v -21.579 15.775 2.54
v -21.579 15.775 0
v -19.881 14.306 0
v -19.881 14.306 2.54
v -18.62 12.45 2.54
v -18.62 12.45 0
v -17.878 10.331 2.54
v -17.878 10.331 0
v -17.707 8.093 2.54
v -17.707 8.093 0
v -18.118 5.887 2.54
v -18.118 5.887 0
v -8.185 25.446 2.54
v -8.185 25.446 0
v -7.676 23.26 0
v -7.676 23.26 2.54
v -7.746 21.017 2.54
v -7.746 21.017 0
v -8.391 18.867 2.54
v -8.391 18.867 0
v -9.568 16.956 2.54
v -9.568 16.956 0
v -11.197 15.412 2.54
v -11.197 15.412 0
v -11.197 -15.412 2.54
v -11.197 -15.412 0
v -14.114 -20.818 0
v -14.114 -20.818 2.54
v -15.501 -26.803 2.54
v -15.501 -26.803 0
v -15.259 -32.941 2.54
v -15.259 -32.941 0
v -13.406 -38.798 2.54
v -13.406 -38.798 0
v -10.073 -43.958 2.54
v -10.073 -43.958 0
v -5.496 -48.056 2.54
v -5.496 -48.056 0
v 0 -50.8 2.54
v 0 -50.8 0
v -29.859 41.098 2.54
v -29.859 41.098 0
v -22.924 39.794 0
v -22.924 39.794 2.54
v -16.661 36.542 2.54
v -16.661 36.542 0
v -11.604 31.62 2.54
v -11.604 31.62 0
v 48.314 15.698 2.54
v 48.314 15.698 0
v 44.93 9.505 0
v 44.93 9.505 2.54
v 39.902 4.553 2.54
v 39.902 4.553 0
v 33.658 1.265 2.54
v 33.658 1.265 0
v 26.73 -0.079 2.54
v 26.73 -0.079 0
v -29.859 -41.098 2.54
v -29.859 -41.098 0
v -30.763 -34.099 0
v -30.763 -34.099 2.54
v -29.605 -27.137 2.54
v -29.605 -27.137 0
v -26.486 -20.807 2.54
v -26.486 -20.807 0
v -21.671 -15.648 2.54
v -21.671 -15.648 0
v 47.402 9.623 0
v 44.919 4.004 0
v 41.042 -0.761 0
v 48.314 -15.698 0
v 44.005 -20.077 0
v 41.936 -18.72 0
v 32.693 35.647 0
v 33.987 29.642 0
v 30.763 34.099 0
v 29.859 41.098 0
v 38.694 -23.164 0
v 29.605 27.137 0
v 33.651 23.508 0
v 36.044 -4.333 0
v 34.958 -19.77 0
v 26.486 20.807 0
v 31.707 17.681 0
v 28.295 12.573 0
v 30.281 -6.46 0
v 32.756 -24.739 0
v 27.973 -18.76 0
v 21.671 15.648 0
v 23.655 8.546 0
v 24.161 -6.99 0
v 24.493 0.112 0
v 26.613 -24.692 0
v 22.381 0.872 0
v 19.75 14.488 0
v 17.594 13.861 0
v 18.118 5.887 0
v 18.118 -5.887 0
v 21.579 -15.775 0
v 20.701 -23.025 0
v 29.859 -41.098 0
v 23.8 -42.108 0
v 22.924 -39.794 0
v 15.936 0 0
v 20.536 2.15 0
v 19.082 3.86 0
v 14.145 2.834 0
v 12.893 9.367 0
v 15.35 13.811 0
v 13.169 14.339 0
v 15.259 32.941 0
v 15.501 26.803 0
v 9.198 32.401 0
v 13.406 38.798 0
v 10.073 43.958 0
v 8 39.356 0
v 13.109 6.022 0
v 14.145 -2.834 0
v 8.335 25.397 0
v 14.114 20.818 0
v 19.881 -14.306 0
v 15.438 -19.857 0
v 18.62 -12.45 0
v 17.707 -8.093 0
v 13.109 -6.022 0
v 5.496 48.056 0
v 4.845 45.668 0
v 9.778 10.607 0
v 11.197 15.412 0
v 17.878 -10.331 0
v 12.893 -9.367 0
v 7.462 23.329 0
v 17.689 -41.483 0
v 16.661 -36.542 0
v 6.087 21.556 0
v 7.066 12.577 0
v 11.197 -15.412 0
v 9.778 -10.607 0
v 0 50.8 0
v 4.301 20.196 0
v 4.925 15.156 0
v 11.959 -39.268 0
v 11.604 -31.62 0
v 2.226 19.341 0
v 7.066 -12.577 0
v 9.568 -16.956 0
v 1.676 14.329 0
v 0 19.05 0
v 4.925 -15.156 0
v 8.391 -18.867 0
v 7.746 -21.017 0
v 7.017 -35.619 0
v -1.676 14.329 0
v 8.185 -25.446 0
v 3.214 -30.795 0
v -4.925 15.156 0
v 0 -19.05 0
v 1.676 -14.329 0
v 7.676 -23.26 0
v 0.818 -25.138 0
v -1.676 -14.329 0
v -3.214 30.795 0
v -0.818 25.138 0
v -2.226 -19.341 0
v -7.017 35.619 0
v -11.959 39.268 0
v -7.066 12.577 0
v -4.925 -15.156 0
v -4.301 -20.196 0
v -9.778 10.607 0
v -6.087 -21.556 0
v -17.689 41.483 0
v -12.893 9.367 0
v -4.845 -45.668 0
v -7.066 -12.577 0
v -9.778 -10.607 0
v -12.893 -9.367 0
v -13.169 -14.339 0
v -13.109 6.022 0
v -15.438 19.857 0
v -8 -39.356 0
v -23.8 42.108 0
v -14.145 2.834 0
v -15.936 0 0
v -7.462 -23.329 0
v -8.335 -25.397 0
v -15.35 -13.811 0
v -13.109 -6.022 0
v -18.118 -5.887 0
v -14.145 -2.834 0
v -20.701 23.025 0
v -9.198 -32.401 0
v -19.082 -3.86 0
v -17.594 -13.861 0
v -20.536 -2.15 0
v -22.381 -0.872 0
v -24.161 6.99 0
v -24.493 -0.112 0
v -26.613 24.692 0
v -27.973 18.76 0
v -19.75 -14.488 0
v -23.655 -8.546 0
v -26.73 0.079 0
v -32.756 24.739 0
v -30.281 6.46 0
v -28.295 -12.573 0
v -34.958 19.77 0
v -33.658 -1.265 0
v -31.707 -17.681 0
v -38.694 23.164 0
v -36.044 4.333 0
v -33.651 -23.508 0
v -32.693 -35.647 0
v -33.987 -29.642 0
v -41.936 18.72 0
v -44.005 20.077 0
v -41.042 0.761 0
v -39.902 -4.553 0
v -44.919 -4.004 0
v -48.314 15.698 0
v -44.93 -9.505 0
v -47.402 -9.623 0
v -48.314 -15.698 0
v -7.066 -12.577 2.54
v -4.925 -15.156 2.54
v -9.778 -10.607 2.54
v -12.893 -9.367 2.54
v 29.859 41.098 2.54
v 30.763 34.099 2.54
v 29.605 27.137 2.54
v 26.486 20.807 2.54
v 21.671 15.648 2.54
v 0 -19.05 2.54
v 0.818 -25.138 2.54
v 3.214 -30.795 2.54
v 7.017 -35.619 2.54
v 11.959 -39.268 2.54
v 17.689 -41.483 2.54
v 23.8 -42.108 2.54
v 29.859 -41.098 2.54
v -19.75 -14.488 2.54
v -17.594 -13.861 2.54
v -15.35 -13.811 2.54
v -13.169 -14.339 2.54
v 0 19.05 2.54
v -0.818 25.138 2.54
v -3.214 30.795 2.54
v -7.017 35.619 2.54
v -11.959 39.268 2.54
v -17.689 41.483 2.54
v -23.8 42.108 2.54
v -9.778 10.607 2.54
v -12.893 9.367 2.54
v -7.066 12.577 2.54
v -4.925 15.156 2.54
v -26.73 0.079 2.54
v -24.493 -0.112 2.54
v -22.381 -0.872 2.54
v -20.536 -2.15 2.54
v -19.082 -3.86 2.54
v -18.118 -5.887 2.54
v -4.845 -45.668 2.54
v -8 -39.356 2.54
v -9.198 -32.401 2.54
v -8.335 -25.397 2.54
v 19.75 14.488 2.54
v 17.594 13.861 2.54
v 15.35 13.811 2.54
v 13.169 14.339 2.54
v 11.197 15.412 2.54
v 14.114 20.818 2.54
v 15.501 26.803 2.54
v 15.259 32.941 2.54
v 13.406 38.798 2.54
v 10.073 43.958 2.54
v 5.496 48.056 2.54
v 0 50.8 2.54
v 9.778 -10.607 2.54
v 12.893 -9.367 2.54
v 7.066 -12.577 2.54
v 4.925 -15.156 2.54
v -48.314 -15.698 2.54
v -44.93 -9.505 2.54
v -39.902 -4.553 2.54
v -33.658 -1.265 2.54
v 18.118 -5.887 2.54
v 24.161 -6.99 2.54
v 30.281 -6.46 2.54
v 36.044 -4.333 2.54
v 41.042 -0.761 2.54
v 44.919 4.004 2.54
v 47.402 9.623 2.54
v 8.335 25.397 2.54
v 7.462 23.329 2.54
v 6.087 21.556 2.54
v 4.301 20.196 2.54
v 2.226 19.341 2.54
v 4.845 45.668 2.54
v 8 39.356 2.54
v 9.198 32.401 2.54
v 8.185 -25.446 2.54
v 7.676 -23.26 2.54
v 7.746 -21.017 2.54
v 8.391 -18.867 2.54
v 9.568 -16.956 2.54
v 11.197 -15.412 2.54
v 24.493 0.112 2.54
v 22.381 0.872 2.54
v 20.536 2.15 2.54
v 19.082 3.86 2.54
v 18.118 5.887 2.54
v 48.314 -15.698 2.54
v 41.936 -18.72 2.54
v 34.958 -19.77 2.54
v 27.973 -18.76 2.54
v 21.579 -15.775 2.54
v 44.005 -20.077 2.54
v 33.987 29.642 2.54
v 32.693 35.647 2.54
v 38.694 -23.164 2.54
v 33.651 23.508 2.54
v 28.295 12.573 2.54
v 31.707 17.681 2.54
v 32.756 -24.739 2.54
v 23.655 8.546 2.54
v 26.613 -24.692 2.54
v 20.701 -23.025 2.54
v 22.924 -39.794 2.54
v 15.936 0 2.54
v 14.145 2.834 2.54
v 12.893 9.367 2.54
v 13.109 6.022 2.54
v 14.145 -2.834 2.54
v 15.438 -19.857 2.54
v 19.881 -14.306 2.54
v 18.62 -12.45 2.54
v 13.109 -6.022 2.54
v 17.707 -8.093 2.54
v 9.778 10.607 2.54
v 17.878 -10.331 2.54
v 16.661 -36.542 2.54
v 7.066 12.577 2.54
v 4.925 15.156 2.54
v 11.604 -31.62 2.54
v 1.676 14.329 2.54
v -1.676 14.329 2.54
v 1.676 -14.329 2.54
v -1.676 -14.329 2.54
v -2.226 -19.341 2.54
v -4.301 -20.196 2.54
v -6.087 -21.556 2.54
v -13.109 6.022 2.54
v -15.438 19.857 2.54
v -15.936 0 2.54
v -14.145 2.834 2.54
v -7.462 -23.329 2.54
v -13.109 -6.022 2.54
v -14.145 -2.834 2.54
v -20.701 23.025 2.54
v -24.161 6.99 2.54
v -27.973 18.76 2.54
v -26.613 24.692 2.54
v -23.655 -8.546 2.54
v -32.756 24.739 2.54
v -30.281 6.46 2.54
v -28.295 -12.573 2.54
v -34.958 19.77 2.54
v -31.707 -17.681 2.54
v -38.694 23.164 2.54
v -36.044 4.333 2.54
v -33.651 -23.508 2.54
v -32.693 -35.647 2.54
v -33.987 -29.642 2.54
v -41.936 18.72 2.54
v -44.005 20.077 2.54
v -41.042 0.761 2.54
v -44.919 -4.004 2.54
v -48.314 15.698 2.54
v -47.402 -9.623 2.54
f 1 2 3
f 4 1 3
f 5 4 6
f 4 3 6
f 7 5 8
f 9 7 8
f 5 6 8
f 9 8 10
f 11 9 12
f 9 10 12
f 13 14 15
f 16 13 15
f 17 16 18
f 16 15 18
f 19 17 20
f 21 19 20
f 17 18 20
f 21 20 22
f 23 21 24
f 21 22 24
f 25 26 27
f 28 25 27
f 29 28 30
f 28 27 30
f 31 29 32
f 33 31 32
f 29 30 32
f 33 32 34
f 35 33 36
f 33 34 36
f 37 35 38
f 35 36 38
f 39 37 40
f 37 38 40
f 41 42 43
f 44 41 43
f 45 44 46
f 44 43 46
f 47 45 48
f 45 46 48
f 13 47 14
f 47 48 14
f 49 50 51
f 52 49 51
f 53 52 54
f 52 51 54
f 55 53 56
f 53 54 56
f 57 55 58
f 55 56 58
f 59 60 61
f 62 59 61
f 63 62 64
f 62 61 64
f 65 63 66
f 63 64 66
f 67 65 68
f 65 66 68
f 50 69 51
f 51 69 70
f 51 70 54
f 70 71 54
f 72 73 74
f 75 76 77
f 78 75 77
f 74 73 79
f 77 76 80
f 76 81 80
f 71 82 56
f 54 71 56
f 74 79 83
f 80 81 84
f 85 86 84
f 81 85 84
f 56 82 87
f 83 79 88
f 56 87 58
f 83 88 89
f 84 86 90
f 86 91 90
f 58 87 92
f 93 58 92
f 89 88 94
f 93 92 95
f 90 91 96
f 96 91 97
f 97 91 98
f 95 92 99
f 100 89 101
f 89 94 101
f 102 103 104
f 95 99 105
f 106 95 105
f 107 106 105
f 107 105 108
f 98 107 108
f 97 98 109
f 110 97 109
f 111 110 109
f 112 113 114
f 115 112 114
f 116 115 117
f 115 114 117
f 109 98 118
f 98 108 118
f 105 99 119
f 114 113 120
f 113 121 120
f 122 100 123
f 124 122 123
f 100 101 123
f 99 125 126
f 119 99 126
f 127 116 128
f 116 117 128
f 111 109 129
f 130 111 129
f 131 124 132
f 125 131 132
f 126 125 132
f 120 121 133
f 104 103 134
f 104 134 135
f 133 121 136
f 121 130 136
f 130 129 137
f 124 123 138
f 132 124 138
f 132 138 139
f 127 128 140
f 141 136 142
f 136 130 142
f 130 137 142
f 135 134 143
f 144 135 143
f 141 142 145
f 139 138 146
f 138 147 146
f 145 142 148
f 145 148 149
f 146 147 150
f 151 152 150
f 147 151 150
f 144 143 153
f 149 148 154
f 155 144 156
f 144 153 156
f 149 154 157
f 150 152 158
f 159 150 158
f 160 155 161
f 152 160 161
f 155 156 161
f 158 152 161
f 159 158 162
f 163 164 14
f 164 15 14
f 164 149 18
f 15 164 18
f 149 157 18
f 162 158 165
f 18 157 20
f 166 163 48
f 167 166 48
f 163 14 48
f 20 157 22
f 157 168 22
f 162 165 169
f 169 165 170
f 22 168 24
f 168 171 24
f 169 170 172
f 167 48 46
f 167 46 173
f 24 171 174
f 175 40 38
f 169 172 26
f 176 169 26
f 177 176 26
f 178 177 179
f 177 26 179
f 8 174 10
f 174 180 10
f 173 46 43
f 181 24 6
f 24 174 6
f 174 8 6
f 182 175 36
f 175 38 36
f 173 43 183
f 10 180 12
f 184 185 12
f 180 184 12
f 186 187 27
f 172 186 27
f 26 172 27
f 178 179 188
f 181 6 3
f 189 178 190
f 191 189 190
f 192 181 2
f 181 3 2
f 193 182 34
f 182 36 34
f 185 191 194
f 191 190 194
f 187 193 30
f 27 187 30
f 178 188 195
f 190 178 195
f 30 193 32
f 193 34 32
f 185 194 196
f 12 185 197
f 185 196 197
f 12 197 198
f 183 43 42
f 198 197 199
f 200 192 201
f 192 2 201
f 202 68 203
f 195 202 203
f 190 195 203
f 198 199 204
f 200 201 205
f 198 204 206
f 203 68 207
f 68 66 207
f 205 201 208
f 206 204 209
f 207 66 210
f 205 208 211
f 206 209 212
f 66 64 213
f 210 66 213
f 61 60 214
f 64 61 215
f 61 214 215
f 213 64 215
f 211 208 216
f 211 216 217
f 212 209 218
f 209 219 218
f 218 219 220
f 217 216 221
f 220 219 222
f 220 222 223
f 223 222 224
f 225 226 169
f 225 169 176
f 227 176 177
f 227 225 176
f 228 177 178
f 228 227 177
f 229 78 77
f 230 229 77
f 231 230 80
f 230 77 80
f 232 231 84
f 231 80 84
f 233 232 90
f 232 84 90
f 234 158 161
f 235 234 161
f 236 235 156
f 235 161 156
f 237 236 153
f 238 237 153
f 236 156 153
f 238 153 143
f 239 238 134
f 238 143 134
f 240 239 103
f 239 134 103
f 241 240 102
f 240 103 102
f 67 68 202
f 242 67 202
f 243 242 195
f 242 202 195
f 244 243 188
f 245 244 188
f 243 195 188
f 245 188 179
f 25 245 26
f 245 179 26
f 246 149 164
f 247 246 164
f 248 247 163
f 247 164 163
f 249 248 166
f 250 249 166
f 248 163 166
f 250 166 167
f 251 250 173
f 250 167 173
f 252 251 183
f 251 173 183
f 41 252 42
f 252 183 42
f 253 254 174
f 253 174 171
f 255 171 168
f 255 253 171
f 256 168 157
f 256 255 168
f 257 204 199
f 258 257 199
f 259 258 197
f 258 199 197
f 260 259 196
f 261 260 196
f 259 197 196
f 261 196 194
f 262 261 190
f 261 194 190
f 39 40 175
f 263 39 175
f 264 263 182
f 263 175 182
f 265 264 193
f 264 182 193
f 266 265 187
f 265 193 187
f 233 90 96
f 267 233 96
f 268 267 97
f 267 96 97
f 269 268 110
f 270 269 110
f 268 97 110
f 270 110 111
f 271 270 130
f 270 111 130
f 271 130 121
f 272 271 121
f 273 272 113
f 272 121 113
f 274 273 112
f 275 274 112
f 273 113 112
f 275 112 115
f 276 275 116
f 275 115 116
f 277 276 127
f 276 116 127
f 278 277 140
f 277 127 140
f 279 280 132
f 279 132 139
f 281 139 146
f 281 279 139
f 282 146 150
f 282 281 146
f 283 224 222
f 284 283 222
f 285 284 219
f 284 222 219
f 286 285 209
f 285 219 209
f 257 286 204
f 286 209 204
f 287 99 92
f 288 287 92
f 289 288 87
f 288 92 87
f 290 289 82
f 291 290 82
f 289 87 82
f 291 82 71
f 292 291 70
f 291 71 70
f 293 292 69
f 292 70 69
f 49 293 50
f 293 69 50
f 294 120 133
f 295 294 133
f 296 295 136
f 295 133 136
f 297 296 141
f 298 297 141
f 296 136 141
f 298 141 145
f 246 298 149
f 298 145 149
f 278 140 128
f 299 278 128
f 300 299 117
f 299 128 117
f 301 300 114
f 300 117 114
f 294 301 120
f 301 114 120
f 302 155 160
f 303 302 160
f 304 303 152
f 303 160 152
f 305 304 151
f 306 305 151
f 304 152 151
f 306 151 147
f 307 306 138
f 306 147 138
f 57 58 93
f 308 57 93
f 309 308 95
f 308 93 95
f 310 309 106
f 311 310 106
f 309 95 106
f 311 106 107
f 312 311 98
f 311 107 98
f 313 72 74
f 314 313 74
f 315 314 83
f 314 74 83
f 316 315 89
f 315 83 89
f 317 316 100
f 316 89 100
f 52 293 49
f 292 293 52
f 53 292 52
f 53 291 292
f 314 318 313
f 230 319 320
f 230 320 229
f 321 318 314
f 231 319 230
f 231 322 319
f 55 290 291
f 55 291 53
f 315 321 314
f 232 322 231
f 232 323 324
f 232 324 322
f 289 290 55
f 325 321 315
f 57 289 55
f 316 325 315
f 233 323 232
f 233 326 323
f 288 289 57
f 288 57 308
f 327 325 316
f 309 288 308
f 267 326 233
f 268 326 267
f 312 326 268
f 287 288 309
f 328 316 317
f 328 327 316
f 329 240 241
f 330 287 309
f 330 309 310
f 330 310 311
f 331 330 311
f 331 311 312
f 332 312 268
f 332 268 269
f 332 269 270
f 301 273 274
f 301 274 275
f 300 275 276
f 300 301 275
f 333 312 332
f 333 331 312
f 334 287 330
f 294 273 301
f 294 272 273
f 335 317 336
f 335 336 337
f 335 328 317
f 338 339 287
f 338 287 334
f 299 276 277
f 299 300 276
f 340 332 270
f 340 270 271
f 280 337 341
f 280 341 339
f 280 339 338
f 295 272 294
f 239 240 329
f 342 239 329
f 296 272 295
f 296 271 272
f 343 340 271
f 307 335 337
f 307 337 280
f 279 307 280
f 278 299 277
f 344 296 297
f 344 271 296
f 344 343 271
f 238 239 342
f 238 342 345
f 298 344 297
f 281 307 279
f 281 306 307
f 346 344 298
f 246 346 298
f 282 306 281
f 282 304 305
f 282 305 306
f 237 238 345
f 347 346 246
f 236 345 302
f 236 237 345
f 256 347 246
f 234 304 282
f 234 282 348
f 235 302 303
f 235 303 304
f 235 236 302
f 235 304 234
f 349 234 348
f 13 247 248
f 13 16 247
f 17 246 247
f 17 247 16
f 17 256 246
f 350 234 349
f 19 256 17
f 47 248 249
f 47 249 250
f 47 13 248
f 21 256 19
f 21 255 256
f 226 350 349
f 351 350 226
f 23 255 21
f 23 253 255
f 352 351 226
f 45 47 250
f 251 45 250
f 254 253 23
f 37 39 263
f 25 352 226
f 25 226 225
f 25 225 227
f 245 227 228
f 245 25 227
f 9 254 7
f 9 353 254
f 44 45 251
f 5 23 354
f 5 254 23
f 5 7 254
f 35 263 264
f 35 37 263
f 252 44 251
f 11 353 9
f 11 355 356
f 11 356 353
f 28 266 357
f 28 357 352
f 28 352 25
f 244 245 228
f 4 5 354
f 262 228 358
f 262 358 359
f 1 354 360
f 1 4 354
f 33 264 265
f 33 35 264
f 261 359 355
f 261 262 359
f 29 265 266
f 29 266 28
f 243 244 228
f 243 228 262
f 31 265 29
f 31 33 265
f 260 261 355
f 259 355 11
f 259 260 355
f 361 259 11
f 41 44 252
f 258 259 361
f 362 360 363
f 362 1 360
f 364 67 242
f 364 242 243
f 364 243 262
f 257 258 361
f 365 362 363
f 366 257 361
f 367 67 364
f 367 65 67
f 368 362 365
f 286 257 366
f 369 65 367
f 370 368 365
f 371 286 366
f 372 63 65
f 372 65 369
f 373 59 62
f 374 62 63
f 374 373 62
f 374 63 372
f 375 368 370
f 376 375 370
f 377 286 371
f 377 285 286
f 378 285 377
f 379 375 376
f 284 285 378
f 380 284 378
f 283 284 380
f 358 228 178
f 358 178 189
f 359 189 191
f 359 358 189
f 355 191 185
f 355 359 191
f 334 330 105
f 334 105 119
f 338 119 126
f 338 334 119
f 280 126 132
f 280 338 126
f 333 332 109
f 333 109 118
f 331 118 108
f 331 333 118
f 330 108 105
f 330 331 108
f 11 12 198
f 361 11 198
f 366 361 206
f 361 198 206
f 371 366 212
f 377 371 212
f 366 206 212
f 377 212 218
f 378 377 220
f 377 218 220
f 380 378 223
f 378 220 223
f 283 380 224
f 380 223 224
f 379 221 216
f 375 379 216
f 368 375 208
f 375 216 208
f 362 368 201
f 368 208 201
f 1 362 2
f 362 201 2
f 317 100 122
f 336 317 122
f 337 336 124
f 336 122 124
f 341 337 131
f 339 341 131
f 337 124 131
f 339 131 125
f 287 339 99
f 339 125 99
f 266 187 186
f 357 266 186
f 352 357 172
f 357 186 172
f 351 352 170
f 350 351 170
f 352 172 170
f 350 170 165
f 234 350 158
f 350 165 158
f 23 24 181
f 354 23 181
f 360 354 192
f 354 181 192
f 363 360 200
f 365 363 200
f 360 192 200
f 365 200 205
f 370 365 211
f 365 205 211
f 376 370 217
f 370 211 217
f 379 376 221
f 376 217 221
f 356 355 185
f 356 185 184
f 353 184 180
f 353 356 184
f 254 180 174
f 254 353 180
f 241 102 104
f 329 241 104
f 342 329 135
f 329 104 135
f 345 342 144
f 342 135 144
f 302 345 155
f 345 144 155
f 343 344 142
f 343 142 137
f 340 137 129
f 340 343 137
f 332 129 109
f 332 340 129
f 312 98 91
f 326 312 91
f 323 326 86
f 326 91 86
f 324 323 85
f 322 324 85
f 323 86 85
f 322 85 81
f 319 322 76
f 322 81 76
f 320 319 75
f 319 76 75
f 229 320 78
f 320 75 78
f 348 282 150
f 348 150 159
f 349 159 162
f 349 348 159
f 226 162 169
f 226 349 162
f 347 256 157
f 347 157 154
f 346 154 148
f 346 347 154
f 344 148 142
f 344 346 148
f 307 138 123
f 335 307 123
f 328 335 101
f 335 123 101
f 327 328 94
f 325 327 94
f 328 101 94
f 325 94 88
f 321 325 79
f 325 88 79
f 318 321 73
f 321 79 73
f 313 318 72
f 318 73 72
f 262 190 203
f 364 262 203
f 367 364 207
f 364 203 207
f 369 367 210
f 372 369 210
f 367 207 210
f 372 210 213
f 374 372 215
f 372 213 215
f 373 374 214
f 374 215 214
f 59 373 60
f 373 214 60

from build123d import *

# Parameters (mm, degrees)
BOSS_EXTRUDE1_DEPTH = 2.54
CIRPATTERN1_COUNT   = 10
CUT_EXTRUDE1_REACH  = 72.152


with BuildPart() as part:
    # Sketch1 → Boss-Extrude1 (new body)
    with BuildSketch(Plane.XY):
        with BuildLine():
            Line((0, 0), (11.197309056, 15.411773743))
            ThreePointArc((11.197309056, 15.411773743), (14.528469134, 35.931399889), (0, 50.8))
            ThreePointArc((0, 50.8), (8.000279424, 39.356176552), (8.334788134, 25.39717695))
            ThreePointArc((8.334788134, 25.39717695), (5.238209343, 20.817448624), (0, 19.05))
            Line((0, 19.05), (0, 0))
        make_face()
    extrude(amount=BOSS_EXTRUDE1_DEPTH)


with BuildPart() as cirpattern1_1:
    # CirPattern1: pattern copy
    add(part.part.rotate(Axis((0, 0, 0), (0, 0, 1)), 1 * 360 / CIRPATTERN1_COUNT))


with BuildPart() as cirpattern1_2:
    # CirPattern1: pattern copy
    add(part.part.rotate(Axis((0, 0, 0), (0, 0, 1)), 2 * 360 / CIRPATTERN1_COUNT))


with BuildPart() as cirpattern1_3:
    # CirPattern1: pattern copy
    add(part.part.rotate(Axis((0, 0, 0), (0, 0, 1)), 3 * 360 / CIRPATTERN1_COUNT))


with BuildPart() as cirpattern1_4:
    # CirPattern1: pattern copy
    add(part.part.rotate(Axis((0, 0, 0), (0, 0, 1)), 4 * 360 / CIRPATTERN1_COUNT))


with BuildPart() as cirpattern1_5:
    # CirPattern1: pattern copy
    add(part.part.rotate(Axis((0, 0, 0), (0, 0, 1)), 5 * 360 / CIRPATTERN1_COUNT))


with BuildPart() as cirpattern1_6:
    # CirPattern1: pattern copy
    add(part.part.rotate(Axis((0, 0, 0), (0, 0, 1)), 6 * 360 / CIRPATTERN1_COUNT))


with BuildPart() as cirpattern1_7:
    # CirPattern1: pattern copy
    add(part.part.rotate(Axis((0, 0, 0), (0, 0, 1)), 7 * 360 / CIRPATTERN1_COUNT))


with BuildPart() as cirpattern1_8:
    # CirPattern1: pattern copy
    add(part.part.rotate(Axis((0, 0, 0), (0, 0, 1)), 8 * 360 / CIRPATTERN1_COUNT))


with BuildPart() as cirpattern1_9:
    # CirPattern1: pattern copy
    add(part.part.rotate(Axis((0, 0, 0), (0, 0, 1)), 9 * 360 / CIRPATTERN1_COUNT))


with BuildPart() as cirpattern1_8_1:
    add(cirpattern1_8.part)

    # Combine1: union CirPattern1_3, CirPattern1_7, CirPattern1_2, CirPattern1_6, part, CirPattern1_1, CirPattern1_5, CirPattern1_9, CirPattern1_4
    add(cirpattern1_3.part)
    add(cirpattern1_7.part)
    add(cirpattern1_2.part)
    add(cirpattern1_6.part)
    add(part.part)
    add(cirpattern1_1.part)
    add(cirpattern1_5.part)
    add(cirpattern1_9.part)
    add(cirpattern1_4.part)

    # Sketch2 → Cut-Extrude1 (cut, up to next)
    with BuildSketch(Plane.XY.offset(2.54), mode=Mode.PRIVATE) as cut_extrude1_sk1:
        with BuildLine():
            ThreePointArc((12.892749535, 9.36713084), (13.527827888, 4.395457728), (15.936314842, 0))
            ThreePointArc((15.936314842, 0), (13.527827888, -4.395457728), (12.892749535, -9.36713084))
            ThreePointArc((12.892749535, -9.36713084), (8.360657429, -11.507457728), (4.924592114, -15.156336076))
            ThreePointArc((4.924592114, -15.156336076), (0, -14.224), (-4.924592114, -15.156336076))
            ThreePointArc((-4.924592114, -15.156336076), (-8.360657429, -11.507457728), (-12.892749535, -9.36713084))
            ThreePointArc((-12.892749535, -9.36713084), (-13.527827888, -4.395457728), (-15.936314842, 0))
            ThreePointArc((-15.936314842, 0), (-13.527827888, 4.395457728), (-12.892749535, 9.36713084))
            ThreePointArc((-12.892749535, 9.36713084), (-8.360657429, 11.507457728), (-4.924592114, 15.156336076))
            ThreePointArc((-4.924592114, 15.156336076), (0, 14.224), (4.924592114, 15.156336076))
            ThreePointArc((4.924592114, 15.156336076), (8.360657429, 11.507457728), (12.892749535, 9.36713084))
        make_face()
    cut_extrude1_tool1 = extrude(cut_extrude1_sk1.sketch, amount=-CUT_EXTRUDE1_REACH, mode=Mode.PRIVATE) & cirpattern1_8_1.part
    add(cut_extrude1_tool1.solids().sort_by_distance((0, 0, 2.54))[0], mode=Mode.SUBTRACT)


solid = cirpattern1_8_1.part
